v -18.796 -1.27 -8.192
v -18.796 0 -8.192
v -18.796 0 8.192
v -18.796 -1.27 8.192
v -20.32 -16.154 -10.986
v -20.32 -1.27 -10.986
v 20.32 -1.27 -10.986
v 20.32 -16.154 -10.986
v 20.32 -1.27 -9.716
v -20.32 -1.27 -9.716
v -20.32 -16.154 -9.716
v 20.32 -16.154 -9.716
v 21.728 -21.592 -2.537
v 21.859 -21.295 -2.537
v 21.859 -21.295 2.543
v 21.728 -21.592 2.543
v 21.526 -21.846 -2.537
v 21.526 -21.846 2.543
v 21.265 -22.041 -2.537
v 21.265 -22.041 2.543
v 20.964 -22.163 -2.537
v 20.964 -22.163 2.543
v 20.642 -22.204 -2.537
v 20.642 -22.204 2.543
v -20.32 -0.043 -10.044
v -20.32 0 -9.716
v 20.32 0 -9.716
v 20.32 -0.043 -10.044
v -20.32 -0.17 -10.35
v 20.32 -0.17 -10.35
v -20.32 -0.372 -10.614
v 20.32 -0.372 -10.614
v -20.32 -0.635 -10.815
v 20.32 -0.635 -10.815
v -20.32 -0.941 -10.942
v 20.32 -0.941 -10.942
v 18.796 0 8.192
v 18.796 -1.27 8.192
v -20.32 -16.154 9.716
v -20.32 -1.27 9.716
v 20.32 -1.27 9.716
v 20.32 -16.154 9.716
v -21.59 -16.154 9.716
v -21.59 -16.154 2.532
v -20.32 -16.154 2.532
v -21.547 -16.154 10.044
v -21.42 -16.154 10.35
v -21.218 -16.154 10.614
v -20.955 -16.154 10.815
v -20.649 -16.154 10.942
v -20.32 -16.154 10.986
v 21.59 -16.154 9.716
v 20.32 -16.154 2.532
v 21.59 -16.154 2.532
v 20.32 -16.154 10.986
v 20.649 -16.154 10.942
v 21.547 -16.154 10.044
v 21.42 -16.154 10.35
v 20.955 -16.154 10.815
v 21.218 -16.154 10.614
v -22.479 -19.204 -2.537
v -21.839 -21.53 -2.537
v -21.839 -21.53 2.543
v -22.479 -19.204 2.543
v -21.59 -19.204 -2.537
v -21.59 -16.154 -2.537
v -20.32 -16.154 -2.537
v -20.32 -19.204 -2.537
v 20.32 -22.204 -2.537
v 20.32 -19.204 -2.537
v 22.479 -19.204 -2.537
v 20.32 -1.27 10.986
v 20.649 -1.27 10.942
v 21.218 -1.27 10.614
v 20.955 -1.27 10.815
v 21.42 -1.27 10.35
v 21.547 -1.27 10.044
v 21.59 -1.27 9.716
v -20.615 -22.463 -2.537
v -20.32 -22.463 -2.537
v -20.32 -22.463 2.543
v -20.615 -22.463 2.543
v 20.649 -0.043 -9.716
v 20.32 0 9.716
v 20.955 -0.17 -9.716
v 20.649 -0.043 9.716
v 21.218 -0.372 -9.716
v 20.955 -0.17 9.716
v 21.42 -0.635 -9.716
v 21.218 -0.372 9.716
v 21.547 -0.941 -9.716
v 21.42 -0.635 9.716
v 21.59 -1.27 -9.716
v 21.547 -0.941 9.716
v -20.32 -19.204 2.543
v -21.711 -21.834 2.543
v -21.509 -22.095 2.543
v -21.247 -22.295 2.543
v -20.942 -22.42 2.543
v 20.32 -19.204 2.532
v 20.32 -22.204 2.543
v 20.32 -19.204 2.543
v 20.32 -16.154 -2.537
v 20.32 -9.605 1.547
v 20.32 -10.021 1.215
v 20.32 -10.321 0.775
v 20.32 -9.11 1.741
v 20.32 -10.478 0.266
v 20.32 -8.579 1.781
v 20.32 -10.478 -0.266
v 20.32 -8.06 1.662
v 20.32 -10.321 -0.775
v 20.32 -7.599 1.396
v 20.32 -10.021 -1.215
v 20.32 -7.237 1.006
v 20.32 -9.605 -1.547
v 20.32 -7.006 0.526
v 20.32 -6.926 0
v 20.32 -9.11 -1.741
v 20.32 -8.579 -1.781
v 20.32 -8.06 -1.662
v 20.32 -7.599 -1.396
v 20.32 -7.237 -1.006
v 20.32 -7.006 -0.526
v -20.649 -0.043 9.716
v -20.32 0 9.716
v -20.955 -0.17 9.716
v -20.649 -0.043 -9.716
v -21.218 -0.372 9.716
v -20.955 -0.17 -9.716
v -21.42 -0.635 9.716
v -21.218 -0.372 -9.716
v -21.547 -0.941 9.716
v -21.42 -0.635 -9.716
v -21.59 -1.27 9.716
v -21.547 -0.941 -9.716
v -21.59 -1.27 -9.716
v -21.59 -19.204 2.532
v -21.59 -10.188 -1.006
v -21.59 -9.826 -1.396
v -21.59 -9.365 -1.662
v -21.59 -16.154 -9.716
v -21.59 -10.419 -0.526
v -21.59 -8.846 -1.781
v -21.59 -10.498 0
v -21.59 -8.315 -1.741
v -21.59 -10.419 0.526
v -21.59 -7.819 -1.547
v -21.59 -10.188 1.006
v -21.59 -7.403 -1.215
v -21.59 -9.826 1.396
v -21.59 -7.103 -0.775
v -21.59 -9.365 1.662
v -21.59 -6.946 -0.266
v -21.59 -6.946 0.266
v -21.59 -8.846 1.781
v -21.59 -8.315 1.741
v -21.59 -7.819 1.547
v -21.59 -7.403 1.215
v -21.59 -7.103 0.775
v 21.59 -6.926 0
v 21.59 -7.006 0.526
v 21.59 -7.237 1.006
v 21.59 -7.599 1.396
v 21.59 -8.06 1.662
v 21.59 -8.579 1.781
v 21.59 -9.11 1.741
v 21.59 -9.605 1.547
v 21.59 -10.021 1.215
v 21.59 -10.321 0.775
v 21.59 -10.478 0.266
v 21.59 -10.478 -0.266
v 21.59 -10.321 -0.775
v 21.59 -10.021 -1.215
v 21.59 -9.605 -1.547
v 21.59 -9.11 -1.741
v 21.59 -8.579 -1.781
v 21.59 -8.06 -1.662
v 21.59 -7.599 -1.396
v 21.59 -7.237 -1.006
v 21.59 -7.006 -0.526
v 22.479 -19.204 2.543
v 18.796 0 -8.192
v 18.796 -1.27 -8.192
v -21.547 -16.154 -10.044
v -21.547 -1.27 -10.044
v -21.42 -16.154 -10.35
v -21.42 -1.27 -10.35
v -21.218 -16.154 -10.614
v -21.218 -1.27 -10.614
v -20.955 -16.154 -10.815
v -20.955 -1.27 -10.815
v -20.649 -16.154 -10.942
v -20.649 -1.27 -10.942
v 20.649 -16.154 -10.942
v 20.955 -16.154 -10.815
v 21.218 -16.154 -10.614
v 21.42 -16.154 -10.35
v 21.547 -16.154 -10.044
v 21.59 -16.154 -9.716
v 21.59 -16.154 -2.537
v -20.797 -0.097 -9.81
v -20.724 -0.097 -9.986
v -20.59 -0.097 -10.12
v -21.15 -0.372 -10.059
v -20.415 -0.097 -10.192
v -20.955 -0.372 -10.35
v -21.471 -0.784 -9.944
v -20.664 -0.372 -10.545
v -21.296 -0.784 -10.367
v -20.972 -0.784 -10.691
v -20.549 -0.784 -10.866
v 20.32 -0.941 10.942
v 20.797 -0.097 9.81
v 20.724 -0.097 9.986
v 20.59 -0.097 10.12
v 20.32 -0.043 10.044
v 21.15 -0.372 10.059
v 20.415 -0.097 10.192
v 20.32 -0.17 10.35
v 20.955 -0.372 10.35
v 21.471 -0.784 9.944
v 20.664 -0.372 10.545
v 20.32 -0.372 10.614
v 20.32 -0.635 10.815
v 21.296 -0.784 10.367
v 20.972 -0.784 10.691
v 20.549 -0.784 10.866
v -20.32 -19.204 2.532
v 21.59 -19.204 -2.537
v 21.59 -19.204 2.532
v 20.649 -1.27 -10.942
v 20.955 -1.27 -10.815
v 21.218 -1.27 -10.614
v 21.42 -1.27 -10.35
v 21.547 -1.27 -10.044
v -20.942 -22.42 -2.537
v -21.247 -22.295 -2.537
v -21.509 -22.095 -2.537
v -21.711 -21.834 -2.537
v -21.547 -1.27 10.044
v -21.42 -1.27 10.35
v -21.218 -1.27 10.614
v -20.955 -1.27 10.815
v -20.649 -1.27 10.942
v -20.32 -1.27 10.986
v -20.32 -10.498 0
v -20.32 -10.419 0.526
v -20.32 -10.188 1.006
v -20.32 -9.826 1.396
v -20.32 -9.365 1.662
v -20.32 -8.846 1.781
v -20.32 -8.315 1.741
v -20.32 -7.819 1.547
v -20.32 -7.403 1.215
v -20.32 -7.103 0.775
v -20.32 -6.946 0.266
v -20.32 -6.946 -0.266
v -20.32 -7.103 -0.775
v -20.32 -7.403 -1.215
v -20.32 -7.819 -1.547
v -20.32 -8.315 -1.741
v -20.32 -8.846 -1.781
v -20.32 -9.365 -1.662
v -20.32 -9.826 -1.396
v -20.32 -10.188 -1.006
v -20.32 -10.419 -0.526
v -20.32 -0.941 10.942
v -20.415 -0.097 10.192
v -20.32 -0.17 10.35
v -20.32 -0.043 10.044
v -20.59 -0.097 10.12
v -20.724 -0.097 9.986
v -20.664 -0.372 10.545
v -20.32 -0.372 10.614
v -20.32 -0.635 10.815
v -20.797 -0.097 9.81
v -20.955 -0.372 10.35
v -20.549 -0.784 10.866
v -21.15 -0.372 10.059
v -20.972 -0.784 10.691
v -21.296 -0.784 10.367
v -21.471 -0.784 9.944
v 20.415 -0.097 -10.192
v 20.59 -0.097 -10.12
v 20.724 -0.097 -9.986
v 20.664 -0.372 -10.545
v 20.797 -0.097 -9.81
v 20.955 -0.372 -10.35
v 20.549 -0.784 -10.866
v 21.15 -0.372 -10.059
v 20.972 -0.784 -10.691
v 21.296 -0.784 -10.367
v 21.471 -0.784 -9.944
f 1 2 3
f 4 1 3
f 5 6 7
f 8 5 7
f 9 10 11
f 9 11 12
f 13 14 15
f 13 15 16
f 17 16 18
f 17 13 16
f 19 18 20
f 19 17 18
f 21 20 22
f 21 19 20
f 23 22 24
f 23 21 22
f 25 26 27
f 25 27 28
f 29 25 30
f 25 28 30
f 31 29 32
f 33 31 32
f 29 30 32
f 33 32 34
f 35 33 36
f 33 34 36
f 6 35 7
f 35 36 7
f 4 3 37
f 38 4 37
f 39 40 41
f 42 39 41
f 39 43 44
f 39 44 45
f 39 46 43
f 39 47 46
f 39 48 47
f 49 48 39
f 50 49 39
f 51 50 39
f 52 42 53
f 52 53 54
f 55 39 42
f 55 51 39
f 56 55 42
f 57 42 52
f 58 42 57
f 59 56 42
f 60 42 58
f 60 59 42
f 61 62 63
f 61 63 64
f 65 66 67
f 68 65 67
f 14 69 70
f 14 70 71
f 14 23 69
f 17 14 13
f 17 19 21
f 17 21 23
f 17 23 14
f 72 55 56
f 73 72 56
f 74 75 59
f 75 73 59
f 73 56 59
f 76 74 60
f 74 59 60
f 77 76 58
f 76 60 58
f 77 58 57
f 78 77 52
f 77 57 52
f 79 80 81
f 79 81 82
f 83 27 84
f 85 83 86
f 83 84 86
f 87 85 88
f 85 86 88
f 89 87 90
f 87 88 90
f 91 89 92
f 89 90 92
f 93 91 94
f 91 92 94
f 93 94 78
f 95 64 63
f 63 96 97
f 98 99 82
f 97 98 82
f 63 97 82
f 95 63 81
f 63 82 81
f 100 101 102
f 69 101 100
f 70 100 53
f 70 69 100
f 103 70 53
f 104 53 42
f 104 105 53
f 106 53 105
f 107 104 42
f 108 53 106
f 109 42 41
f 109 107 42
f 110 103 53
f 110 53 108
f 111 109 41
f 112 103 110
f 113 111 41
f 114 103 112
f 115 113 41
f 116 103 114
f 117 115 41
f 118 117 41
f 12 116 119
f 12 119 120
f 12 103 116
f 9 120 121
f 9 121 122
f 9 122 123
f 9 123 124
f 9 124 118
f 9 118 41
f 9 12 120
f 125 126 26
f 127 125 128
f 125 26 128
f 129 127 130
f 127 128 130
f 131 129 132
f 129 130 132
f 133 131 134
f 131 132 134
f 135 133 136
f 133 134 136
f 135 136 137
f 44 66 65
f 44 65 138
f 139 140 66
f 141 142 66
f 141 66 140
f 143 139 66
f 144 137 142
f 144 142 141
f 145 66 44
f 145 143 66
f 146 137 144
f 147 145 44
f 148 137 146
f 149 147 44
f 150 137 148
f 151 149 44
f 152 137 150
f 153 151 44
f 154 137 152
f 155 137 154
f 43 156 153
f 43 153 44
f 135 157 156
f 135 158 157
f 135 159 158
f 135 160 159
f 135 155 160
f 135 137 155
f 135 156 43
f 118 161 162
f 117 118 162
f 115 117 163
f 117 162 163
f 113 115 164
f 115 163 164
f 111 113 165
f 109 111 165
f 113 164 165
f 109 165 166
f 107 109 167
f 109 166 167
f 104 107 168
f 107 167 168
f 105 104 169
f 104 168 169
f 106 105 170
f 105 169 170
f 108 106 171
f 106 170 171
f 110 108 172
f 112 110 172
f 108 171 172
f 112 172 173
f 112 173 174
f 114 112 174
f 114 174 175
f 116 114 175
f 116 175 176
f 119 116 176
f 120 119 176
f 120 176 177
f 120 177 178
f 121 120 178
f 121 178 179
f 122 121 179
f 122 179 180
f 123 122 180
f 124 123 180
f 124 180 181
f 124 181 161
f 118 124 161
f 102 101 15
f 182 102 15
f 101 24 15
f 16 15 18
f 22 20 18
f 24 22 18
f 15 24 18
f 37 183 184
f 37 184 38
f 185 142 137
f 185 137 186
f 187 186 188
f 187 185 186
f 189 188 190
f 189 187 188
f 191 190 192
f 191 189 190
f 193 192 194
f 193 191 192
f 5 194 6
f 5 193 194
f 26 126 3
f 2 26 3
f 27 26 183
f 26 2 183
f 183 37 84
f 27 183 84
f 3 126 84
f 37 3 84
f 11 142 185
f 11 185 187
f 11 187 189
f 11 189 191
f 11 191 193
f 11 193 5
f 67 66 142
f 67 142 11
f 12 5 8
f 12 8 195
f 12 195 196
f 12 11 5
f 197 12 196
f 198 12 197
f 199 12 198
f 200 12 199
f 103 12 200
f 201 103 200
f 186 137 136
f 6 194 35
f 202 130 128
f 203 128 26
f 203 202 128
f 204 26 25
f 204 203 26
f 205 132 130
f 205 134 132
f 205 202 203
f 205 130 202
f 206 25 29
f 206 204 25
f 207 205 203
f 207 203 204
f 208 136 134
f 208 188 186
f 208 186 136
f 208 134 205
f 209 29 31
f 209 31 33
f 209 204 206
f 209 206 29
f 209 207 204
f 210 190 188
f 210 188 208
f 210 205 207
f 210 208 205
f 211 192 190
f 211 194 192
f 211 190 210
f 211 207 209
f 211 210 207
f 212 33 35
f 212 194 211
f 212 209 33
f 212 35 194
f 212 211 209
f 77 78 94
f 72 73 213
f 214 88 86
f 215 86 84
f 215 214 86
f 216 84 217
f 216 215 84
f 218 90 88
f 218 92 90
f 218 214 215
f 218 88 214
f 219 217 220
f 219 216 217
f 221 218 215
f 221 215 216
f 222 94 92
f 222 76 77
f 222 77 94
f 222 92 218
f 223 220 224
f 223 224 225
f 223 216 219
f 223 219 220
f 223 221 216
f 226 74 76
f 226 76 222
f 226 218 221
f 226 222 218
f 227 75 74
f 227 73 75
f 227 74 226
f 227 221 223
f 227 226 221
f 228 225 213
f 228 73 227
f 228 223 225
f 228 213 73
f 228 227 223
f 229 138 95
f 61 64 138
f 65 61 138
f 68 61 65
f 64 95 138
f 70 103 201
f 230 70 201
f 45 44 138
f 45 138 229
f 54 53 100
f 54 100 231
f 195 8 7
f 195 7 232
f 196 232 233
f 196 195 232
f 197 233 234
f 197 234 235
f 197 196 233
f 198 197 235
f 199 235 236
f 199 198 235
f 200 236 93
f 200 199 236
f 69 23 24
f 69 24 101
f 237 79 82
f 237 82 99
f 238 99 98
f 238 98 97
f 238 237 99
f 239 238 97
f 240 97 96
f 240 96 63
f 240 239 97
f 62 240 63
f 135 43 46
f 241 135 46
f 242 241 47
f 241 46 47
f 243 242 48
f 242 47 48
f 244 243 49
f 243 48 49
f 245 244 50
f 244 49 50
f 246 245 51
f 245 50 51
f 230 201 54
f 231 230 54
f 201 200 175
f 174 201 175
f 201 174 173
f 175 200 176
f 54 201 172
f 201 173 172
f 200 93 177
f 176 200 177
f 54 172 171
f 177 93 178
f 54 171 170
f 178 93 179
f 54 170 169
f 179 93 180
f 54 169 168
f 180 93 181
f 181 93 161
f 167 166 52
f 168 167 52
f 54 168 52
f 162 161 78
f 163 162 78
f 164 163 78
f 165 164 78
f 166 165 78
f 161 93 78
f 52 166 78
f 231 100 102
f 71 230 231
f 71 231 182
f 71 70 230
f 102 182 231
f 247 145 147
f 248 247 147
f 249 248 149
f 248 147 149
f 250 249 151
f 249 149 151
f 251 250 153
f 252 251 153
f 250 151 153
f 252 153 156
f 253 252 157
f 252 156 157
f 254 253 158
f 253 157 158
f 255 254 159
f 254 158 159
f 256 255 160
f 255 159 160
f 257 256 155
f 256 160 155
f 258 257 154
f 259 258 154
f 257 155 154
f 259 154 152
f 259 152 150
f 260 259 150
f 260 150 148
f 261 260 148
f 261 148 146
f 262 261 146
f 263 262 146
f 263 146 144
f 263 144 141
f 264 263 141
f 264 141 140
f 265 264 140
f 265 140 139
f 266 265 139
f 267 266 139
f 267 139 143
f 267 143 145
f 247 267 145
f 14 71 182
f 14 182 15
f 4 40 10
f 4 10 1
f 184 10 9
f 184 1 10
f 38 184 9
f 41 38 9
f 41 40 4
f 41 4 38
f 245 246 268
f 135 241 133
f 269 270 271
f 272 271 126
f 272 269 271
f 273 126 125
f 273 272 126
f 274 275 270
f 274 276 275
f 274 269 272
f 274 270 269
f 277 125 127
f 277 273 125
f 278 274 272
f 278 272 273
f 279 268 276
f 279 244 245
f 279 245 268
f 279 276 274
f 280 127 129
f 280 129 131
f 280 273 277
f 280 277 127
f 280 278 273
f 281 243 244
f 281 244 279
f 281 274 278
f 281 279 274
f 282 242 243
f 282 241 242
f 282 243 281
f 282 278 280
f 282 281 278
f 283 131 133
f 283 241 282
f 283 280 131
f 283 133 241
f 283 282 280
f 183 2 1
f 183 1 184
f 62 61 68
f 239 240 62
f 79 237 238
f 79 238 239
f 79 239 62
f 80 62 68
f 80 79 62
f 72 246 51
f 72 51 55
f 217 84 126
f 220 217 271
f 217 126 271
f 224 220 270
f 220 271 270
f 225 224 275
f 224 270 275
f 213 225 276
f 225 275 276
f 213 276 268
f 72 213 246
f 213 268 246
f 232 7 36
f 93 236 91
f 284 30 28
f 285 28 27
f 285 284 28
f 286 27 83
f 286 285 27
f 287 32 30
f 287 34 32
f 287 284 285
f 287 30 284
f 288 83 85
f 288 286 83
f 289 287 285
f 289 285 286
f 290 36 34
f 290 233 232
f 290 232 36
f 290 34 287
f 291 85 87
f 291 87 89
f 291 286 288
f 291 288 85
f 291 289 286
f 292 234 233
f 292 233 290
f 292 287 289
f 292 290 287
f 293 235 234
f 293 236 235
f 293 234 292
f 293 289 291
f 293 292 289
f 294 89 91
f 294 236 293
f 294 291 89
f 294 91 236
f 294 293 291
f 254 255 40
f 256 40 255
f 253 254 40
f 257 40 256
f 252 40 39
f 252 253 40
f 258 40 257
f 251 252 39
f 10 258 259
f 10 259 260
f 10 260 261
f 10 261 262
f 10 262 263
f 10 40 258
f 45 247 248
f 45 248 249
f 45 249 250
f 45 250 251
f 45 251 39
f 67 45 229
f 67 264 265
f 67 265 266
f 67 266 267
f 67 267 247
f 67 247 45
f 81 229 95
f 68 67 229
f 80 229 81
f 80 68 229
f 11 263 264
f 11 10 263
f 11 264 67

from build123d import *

# Parameters (mm, degrees)
F0_W      = 43.18
F0_H      = 21.971
F0_W_2    = 40.64
F0_H_2    = 19.431
F1_DEPTH  = 16.1544
F0_W_3    = 37.592
F0_H_3    = 16.383
F2_DEPTH  = 1.27
F3_R      = 1.27
F4_R      = 1.27
F5_R      = 1.785938
F6_DEPTH  = 7.62
F7_R      = 1.785938
F8_DEPTH  = 7.62
F9_W      = 1.27
F9_H      = 5.068467
F10_DEPTH = 3.05
F12_DEPTH = 5.08
F14_DEPTH = 5.08


with BuildPart() as f1:
    # F0 (on Front) → F1 (new body)
    with BuildSketch(Plane.XZ):
        Rectangle(F0_W, F0_H)
        Rectangle(F0_W_2, F0_H_2, mode=Mode.SUBTRACT)
    extrude(amount=F1_DEPTH)

    # F0 (on Front) → F2 (join)
    with BuildSketch(Plane.XZ):
        Rectangle(F0_W_2, F0_H_2)
        Rectangle(F0_W_3, F0_H_3, mode=Mode.SUBTRACT)
    extrude(amount=F2_DEPTH)

    # F3
    f3_edges = [f1.edges().sort_by_distance(p)[0] for p in [
        (-21.59, -8.0772, 10.9855),
        (-21.59, -8.0772, -10.9855),
        (21.59, -8.0772, -10.9855),
        (21.59, -8.0772, 10.9855),
    ]]
    fillet(f3_edges, radius=F3_R)

    # F4
    f4_edges = [f1.edges().sort_by_distance(p)[0] for p in [
        (0, 0, -10.9855),
    ]]
    fillet(f4_edges, radius=F4_R)

    # F5 (on face) → F6 (cut)
    with BuildSketch(Plane.YZ.offset(21.59)):
        with Locations((-8.7122, 0)):
            Circle(F5_R)
    extrude(amount=-F6_DEPTH, mode=Mode.SUBTRACT)

    # F7 (on face) → F8 (cut)
    with BuildSketch(Plane(origin=(-21.59, 0, 0), x_dir=(0, -1, 0), z_dir=(-1, 0, 0))):
        with Locations((8.7122, 0)):
            Circle(F7_R)
    extrude(amount=-F8_DEPTH, mode=Mode.SUBTRACT)

    # F9 (on face) → F10 (join)
    with BuildSketch(Plane.XZ.offset(16.1544)):
        with Locations((-20.955, -0.002476)):
            Rectangle(F9_W, F9_H)
        with Locations((20.955, -0.002476)):
            Rectangle(F9_W, F9_H)
    extrude(amount=F10_DEPTH)

    # F11 (on face) → F12 (join)
    with BuildSketch(Plane(origin=(0, 0, -2.53671), x_dir=(1, 0, 0), z_dir=(0, 0, -1))):
        with BuildLine():
            Line((20.32, 22.2044), (20.32, 19.2044))
            Line((20.32, 19.2044), (21.59, 19.2044))
            Line((21.59, 19.2044), (22.479, 19.2044))
            Line((22.479, 19.2044), (21.859416, 21.295234))
            ThreePointArc((21.859416, 21.295234), (21.401571, 21.952034), (20.641755, 22.2044))
            Line((20.641755, 22.2044), (20.32, 22.2044))
        make_face()
    extrude(amount=-F12_DEPTH)

    # F13 (on face) → F14 (join)
    with BuildSketch(Plane(origin=(0, 0, -2.53671), x_dir=(1, 0, 0), z_dir=(0, 0, -1))):
        with BuildLine():
            Line((-21.59, 19.2044), (-20.32, 19.2044))
            Line((-20.32, 19.2044), (-20.32, 22.46322))
            Line((-20.32, 22.46322), (-20.614604, 22.46322))
            ThreePointArc((-20.614604, 22.46322), (-21.384353, 22.203362), (-21.839101, 21.530127))
            Line((-21.839101, 21.530127), (-22.479, 19.2044))
            Line((-22.479, 19.2044), (-21.59, 19.2044))
        make_face()
    extrude(amount=-F14_DEPTH)


solid = f1.part
